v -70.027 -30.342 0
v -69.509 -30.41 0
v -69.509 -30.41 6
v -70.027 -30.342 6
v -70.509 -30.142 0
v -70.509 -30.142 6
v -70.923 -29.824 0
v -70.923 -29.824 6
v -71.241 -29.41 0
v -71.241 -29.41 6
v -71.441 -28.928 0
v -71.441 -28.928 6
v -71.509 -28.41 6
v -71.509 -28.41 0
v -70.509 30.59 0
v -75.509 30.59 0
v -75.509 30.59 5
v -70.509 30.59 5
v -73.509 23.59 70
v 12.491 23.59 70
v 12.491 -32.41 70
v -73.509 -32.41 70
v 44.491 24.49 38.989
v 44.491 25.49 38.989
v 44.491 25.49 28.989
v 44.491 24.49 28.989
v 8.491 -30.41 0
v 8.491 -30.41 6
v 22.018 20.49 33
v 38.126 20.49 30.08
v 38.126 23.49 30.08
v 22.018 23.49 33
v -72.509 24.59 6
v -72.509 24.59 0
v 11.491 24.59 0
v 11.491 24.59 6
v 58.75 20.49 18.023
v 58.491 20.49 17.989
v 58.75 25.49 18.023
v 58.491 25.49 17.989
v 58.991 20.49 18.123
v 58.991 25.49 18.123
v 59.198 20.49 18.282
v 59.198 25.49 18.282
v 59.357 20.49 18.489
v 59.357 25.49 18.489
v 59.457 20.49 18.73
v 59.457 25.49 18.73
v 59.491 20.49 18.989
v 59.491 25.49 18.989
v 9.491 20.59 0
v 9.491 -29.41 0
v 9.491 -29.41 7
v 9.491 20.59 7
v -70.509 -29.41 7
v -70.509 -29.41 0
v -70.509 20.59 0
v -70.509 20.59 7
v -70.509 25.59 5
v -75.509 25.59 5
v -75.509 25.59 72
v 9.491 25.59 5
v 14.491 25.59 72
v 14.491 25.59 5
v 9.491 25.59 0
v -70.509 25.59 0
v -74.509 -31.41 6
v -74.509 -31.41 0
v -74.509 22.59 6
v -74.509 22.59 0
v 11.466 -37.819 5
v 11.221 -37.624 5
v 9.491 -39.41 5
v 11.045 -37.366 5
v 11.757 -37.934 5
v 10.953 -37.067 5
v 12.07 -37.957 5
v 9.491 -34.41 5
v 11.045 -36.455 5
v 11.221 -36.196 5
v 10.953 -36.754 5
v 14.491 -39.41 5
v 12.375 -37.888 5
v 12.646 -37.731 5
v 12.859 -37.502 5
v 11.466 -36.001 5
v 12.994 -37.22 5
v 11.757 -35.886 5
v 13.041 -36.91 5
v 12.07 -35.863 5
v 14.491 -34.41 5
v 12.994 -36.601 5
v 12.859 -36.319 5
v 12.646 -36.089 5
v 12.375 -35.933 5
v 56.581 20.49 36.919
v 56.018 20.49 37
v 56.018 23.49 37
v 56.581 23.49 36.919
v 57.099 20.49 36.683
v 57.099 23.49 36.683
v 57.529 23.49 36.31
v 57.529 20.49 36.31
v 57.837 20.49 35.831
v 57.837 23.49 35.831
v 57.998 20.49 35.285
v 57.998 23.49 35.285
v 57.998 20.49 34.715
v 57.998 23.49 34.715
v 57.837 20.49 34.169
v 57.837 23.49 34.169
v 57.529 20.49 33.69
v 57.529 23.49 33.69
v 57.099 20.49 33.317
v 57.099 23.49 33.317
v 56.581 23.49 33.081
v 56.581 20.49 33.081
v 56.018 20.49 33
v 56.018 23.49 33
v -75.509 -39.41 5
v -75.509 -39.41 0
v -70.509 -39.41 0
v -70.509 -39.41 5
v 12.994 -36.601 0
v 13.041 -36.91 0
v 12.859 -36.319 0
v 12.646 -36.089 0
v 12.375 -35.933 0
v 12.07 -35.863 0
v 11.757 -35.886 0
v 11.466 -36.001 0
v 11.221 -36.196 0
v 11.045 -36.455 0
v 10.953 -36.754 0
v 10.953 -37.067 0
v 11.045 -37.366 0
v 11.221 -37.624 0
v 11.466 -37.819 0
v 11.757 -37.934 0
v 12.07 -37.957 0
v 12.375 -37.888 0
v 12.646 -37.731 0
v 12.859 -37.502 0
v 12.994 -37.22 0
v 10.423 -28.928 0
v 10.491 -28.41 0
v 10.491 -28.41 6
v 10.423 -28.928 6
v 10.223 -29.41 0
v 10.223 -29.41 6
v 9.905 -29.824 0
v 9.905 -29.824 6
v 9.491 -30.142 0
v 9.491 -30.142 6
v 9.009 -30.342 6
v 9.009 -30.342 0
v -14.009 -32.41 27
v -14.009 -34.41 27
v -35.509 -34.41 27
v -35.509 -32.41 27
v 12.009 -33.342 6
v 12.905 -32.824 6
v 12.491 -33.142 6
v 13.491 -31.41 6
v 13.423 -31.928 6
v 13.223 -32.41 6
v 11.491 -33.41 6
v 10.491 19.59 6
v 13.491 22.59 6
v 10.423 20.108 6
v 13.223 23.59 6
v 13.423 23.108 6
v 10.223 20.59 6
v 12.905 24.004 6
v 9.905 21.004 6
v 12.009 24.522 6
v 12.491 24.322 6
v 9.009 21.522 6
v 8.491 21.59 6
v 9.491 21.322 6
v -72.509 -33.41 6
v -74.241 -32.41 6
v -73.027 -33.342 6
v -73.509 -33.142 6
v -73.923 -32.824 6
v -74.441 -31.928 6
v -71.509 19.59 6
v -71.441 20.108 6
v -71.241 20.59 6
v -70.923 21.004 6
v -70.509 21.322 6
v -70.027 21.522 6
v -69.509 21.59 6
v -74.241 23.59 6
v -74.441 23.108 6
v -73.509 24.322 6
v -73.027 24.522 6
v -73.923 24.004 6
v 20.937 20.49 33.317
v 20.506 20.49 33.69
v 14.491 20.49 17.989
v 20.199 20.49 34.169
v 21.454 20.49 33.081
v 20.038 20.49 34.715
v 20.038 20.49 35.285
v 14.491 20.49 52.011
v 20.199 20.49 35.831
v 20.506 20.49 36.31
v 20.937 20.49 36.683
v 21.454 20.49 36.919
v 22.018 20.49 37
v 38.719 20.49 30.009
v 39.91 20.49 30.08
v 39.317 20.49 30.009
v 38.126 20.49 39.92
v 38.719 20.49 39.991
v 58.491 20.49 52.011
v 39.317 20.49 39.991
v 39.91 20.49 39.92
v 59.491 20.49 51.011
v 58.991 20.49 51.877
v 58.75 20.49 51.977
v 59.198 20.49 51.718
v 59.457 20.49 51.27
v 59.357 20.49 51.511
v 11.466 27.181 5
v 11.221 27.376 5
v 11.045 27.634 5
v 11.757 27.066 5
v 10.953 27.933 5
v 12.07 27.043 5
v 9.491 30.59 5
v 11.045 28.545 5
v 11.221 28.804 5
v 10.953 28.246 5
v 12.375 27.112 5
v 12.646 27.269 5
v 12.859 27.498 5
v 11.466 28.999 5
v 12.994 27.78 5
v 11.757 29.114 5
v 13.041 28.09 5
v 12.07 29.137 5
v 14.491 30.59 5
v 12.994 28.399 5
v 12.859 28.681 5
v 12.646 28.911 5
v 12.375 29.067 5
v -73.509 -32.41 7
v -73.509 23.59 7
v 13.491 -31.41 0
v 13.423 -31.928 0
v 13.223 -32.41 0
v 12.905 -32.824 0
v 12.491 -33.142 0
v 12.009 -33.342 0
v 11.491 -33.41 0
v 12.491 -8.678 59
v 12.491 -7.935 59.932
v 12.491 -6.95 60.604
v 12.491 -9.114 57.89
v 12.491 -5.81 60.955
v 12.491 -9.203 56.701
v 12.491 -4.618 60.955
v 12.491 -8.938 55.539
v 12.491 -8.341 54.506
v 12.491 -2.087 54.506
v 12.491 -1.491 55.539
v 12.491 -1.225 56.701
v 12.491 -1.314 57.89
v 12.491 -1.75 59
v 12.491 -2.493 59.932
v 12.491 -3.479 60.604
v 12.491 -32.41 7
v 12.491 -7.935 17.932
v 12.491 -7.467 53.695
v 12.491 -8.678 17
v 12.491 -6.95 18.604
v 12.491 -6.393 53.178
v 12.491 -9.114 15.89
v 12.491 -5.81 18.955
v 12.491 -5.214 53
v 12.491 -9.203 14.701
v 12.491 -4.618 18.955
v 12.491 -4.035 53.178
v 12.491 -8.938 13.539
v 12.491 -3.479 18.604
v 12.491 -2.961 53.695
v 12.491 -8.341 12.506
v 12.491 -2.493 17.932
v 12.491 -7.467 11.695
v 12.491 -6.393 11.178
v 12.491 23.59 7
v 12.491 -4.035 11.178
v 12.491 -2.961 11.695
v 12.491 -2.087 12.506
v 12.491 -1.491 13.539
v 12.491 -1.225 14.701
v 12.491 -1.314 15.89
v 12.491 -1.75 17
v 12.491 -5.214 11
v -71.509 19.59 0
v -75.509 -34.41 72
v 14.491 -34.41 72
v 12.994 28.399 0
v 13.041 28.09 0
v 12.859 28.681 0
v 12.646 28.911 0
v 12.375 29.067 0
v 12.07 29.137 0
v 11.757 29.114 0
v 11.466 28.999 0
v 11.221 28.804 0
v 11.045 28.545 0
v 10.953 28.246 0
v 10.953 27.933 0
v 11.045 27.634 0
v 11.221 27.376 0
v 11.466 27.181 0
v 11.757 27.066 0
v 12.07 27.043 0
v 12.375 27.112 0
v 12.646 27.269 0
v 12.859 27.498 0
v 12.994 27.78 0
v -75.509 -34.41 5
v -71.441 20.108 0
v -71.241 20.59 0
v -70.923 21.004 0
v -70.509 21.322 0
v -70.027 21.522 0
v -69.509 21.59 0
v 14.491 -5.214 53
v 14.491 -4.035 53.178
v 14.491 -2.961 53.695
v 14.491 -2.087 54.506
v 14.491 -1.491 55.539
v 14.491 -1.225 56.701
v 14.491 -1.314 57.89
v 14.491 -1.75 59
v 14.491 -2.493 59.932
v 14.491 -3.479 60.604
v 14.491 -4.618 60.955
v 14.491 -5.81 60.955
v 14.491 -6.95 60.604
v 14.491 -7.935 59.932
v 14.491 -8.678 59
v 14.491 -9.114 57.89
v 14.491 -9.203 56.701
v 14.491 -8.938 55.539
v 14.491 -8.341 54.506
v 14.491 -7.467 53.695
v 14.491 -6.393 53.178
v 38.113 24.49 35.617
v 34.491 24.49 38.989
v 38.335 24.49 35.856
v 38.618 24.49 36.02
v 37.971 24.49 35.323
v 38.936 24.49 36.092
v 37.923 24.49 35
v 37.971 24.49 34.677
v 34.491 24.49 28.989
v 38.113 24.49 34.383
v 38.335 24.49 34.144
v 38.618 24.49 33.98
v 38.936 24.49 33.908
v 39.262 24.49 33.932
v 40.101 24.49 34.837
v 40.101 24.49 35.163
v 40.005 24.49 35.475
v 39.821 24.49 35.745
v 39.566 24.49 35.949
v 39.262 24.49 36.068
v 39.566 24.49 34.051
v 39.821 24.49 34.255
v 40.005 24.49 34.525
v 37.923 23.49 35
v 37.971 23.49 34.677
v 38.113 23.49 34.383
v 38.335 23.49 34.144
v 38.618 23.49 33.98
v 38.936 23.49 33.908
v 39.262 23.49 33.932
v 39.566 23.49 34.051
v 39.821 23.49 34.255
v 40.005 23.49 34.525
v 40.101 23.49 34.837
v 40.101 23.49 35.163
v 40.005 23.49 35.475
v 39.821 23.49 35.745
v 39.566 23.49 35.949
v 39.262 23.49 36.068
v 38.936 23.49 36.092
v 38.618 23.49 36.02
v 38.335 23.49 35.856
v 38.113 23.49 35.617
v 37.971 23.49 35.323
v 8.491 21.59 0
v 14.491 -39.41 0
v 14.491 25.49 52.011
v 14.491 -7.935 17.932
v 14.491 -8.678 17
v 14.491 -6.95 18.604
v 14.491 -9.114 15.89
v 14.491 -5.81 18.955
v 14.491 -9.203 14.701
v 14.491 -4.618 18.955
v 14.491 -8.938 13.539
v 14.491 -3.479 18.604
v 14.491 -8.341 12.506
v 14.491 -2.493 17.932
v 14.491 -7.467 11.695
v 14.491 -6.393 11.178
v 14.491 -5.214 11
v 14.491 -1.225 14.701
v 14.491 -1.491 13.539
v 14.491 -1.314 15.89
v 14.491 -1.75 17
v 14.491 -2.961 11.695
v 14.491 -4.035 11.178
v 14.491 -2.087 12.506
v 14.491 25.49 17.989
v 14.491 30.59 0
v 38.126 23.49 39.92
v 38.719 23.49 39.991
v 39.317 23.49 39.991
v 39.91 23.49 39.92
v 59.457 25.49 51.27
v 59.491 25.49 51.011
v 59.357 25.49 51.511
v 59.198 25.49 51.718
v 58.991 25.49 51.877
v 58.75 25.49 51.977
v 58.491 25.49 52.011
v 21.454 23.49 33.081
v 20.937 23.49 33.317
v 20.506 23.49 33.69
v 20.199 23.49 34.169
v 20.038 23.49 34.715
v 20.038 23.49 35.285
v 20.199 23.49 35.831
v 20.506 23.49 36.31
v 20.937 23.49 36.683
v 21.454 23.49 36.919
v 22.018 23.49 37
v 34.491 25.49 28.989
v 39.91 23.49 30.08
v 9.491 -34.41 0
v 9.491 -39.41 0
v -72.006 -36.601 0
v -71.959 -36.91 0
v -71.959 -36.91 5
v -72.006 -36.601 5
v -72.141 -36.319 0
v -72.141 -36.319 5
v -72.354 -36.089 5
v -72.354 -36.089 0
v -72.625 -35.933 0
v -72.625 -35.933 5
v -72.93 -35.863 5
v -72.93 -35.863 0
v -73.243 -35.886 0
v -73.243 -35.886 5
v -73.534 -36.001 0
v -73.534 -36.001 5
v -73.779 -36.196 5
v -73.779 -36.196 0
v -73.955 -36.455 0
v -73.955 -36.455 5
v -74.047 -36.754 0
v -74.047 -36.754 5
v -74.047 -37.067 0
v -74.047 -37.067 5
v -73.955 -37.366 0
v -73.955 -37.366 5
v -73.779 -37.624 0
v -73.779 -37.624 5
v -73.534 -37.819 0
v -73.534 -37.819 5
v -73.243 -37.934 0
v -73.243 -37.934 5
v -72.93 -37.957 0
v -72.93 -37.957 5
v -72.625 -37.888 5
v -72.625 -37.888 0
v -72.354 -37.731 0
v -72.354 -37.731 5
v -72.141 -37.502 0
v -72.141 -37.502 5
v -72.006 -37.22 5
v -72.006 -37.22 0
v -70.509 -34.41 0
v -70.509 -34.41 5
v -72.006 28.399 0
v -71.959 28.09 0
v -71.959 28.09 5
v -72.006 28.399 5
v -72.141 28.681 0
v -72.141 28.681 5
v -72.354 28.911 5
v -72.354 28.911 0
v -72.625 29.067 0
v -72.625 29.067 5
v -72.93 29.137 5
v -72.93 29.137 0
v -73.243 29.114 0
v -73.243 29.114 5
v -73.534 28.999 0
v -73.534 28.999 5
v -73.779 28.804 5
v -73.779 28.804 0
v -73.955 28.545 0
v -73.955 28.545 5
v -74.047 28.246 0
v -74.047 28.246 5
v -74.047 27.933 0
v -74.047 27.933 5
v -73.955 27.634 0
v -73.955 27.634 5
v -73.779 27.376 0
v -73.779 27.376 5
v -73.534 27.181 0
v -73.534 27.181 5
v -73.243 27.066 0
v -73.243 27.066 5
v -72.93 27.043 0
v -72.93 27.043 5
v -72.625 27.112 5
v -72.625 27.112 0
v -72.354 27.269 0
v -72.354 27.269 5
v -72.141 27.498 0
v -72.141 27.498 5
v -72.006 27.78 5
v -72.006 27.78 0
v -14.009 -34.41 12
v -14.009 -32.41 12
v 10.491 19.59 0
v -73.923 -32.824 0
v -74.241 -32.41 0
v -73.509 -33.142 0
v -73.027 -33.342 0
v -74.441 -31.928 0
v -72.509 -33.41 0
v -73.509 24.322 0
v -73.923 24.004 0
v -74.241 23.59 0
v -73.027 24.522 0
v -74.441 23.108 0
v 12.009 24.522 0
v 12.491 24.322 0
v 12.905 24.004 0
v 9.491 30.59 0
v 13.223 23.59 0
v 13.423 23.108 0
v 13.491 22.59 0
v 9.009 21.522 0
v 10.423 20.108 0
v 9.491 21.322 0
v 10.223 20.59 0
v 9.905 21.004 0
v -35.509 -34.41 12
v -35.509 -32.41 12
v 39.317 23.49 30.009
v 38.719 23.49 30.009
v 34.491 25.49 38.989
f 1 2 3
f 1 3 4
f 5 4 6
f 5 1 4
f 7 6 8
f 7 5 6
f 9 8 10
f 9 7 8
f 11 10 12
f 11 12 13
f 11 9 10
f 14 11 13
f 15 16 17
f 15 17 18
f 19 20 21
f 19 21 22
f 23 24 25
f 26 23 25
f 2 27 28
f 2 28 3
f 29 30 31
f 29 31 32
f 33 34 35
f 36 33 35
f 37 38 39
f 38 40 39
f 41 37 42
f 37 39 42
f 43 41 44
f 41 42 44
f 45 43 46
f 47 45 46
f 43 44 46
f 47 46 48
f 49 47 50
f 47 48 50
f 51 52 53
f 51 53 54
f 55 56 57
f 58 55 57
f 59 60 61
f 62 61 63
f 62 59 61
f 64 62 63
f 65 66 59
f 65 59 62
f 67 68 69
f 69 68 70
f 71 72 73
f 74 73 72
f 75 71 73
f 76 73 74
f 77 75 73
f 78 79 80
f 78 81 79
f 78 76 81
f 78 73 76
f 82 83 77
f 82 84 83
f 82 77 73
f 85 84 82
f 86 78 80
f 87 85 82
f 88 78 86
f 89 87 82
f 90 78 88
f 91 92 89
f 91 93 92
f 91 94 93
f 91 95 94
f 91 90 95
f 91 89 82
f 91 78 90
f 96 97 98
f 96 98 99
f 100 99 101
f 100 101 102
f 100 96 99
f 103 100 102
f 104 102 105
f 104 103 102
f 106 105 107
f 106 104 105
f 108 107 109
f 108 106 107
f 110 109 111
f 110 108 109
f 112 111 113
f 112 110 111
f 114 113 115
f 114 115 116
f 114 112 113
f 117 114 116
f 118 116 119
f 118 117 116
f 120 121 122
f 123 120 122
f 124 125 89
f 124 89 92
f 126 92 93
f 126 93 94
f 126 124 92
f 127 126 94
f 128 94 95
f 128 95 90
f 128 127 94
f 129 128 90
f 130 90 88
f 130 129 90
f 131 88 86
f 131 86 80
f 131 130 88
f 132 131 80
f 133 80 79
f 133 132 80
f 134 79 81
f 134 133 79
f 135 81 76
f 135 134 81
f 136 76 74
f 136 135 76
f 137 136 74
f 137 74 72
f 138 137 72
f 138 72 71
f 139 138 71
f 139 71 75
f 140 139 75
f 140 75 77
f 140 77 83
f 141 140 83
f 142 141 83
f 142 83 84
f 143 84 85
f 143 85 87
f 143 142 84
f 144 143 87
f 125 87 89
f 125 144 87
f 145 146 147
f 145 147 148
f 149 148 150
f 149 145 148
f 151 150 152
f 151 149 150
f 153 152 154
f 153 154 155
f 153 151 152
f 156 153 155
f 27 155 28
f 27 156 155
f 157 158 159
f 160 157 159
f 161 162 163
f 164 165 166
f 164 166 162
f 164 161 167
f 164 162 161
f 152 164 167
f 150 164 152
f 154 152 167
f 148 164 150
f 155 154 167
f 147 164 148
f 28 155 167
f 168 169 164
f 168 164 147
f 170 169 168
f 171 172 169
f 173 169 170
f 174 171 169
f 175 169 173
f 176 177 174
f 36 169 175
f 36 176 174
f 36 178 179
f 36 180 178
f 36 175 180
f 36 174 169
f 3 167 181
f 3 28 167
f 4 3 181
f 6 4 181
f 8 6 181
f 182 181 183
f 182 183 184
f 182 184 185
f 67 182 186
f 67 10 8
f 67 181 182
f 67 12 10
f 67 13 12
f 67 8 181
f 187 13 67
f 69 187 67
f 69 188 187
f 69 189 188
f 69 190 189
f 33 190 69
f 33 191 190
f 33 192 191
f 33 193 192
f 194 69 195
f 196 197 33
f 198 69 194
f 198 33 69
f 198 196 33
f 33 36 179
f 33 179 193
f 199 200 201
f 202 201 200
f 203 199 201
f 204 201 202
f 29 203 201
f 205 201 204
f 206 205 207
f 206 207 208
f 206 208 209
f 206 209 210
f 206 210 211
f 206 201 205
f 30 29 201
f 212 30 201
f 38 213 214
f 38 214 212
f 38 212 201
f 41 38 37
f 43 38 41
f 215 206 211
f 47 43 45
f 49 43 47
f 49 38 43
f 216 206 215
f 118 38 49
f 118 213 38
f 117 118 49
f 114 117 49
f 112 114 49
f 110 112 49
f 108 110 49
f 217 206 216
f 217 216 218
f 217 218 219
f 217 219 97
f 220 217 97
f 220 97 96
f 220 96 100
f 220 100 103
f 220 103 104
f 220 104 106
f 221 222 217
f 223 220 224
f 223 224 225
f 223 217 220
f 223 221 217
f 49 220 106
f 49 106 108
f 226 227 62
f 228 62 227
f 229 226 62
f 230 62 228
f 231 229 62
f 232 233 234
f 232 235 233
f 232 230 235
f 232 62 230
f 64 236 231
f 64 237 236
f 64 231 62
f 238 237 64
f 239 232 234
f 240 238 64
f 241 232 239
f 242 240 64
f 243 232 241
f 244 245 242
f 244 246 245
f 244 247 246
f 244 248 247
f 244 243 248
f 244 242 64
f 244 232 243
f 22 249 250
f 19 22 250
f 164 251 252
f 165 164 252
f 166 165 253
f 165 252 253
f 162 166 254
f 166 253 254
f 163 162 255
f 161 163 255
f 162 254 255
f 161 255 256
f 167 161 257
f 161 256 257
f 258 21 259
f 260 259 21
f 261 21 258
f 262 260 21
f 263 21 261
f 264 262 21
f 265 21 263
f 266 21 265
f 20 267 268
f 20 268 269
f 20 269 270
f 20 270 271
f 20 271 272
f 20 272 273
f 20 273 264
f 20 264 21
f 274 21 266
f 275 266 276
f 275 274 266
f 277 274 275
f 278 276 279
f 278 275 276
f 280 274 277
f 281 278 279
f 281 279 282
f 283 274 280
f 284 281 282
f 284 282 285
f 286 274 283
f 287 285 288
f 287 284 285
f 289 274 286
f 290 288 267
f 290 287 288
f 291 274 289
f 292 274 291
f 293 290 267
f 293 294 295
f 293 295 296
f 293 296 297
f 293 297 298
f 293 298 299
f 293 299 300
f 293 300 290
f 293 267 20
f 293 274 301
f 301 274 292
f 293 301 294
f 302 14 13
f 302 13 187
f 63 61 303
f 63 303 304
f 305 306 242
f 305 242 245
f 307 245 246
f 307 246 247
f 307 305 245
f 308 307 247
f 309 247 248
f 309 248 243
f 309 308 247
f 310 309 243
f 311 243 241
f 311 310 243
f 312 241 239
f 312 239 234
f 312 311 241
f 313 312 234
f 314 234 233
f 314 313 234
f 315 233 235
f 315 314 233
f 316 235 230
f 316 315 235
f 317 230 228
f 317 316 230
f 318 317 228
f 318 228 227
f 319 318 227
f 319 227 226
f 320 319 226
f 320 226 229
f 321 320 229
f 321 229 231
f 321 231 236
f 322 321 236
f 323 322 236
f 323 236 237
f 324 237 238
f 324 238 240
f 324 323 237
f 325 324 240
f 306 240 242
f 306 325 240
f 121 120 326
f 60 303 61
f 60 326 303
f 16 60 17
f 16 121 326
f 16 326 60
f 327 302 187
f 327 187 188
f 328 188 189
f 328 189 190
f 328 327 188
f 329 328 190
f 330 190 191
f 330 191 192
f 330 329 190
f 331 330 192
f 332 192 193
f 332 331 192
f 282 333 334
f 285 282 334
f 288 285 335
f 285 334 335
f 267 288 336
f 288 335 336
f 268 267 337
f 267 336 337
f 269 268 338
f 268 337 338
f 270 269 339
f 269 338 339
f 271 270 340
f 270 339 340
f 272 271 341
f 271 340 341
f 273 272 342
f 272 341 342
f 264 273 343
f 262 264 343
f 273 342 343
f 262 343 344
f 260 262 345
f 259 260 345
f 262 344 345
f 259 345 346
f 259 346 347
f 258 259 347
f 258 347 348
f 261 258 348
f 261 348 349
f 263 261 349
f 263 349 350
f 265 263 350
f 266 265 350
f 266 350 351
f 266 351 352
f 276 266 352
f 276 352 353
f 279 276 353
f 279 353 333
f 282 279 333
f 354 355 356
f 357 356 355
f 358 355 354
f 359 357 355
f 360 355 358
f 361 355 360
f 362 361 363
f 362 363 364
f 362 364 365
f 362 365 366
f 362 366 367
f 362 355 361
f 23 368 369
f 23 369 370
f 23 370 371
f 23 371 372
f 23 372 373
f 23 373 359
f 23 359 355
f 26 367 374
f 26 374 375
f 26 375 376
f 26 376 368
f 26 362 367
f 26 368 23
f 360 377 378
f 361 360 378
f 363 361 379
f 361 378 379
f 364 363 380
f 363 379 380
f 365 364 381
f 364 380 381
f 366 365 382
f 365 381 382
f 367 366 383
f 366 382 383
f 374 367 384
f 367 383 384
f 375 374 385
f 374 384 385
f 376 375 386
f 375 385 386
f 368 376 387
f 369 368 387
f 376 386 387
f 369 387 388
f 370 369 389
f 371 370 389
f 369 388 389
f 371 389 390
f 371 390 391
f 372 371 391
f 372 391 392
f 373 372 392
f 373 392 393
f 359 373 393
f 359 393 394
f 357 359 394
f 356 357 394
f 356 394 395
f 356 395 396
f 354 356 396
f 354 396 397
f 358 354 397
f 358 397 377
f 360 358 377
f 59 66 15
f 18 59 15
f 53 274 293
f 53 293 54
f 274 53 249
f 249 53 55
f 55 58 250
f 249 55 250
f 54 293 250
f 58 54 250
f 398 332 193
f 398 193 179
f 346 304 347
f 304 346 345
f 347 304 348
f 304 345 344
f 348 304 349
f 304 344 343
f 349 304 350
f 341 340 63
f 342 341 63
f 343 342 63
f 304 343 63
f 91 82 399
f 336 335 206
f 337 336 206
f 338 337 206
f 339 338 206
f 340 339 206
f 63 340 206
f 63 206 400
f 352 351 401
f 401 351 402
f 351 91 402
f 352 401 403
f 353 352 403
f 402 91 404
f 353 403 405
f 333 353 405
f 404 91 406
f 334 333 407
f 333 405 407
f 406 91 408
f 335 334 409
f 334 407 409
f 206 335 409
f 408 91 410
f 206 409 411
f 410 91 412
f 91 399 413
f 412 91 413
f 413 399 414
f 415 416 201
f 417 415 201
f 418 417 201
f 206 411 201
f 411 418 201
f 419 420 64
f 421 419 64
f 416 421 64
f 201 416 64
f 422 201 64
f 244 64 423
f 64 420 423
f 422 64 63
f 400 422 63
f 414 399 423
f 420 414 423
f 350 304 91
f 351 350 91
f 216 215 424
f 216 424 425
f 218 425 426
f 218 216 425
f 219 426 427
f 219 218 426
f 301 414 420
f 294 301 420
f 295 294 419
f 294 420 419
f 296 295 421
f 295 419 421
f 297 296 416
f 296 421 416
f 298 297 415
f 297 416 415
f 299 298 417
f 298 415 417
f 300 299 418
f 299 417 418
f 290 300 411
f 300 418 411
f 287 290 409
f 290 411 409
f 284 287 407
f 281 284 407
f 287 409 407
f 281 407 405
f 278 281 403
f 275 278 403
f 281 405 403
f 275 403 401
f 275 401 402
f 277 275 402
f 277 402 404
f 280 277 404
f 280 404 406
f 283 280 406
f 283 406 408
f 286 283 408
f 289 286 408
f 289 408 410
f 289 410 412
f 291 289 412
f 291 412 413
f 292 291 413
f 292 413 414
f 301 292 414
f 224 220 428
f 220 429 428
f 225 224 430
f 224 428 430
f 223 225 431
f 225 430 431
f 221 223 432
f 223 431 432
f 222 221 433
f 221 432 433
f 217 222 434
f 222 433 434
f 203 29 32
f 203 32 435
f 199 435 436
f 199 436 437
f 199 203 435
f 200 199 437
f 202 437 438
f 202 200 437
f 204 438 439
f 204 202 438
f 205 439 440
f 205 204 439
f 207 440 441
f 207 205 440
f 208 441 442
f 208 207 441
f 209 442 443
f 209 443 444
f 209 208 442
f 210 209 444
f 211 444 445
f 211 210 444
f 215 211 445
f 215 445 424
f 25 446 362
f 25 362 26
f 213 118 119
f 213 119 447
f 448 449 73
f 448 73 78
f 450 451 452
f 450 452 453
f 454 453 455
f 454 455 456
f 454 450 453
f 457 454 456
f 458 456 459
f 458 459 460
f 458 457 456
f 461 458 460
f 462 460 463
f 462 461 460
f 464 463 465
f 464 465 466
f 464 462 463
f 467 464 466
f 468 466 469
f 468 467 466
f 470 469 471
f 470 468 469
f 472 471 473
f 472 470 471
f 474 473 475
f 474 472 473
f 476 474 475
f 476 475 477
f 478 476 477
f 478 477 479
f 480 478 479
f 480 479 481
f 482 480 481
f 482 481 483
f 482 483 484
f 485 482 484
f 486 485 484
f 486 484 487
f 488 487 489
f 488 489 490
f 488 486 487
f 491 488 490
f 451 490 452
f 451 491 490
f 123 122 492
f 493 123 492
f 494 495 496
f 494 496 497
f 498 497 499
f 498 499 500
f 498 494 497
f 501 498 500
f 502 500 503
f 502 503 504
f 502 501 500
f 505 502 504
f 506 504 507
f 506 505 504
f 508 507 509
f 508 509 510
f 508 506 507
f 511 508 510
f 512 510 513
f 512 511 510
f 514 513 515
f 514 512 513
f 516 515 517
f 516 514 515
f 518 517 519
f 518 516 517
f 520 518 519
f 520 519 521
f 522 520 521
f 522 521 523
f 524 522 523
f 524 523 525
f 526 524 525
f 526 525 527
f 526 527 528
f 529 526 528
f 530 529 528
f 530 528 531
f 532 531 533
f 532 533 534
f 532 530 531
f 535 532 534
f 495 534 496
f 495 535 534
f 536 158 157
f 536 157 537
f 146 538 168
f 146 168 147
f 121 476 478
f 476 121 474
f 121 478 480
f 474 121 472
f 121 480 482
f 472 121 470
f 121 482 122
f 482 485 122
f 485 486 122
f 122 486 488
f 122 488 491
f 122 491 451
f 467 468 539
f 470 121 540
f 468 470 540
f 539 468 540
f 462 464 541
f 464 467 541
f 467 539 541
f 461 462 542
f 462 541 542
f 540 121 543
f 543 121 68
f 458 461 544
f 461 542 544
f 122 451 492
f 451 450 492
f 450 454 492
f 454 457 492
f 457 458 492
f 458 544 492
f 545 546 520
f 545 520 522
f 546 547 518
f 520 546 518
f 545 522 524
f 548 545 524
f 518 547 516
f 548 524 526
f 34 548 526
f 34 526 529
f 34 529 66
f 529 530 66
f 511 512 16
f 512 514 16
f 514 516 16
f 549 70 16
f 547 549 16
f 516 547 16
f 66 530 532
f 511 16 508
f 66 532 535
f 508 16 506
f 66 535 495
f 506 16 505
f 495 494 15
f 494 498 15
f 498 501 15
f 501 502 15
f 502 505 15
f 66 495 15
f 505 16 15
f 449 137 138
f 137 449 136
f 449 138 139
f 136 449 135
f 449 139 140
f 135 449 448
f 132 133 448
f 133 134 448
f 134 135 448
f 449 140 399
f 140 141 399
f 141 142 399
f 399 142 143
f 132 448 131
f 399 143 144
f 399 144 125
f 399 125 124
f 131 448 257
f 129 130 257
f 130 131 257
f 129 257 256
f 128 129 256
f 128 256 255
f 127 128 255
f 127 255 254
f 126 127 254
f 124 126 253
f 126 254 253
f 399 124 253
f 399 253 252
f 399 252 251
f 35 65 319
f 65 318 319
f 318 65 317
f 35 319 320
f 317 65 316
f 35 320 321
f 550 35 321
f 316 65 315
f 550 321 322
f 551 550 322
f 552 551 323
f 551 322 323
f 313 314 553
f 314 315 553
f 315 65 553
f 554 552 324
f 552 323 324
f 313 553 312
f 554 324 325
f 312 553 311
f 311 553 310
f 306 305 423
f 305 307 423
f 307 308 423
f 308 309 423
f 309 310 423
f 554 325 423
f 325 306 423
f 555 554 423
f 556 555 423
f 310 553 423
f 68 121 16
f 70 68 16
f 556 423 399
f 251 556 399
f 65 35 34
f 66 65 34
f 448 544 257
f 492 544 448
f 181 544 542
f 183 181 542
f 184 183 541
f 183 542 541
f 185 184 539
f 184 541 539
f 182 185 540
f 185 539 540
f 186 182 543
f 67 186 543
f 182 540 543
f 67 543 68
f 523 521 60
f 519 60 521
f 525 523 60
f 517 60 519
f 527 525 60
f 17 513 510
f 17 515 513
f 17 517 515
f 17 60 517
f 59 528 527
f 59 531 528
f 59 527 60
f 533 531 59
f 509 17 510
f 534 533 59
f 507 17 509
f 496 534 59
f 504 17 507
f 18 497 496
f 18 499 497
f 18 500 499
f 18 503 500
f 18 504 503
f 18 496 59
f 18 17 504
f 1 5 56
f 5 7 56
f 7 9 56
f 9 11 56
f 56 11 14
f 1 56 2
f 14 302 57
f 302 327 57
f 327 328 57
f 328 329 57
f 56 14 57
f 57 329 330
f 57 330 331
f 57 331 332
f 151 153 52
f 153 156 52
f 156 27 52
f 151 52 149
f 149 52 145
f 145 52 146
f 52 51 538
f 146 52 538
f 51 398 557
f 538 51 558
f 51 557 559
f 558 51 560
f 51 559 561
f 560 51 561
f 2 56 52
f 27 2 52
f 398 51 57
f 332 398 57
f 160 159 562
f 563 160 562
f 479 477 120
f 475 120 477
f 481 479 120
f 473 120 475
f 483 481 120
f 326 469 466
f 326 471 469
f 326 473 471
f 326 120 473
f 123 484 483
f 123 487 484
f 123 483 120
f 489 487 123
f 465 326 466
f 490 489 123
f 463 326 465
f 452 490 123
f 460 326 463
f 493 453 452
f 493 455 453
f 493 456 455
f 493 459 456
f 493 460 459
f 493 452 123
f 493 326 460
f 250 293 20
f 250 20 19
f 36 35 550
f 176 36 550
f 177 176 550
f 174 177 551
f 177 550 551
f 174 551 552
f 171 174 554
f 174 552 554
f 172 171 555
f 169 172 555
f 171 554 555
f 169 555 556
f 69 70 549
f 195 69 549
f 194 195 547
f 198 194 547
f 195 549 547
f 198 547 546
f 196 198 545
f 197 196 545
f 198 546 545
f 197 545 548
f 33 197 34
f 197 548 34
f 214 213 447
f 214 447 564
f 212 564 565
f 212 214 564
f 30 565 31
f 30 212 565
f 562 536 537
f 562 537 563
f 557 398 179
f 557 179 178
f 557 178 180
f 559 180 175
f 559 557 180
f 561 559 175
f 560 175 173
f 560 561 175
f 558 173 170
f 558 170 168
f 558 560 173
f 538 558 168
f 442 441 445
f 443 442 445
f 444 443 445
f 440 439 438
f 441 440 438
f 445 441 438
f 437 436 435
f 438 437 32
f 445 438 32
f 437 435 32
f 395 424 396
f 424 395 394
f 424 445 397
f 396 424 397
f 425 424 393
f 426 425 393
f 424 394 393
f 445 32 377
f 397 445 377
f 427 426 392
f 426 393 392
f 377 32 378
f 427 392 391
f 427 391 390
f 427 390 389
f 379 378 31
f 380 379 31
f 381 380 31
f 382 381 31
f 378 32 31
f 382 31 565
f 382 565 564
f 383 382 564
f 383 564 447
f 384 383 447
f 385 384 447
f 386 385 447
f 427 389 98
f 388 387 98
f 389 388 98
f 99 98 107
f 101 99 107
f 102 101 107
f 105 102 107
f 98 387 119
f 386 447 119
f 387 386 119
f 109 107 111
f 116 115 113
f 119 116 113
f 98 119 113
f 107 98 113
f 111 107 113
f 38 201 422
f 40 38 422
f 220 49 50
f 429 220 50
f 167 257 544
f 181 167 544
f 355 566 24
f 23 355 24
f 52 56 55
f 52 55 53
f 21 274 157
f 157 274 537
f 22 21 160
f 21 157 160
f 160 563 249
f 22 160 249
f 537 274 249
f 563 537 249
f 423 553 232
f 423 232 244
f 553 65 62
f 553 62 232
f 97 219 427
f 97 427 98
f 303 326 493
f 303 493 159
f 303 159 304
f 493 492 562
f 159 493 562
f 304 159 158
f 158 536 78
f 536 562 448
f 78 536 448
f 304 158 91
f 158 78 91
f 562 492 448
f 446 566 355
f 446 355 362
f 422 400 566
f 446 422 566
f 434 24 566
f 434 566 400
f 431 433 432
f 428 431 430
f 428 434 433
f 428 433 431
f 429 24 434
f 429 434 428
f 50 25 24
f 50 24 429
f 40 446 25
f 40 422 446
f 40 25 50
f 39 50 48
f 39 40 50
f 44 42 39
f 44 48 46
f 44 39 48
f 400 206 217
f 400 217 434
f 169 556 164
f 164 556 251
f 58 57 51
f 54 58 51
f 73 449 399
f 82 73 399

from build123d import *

# Parameters (mm, degrees)
SKETCH_1_W           = 135
SKETCH_1_H           = 60
EXTRUDE_1_DEPTH      = 70
SKETCH_6_W           = 45
SKETCH_6_H           = 70
CUT_EXTRUDE_1_DEPTH  = 0.1
SKETCH_5_W           = 45
SKETCH_5_H           = 70
CUT_EXTRUDE_2_DEPTH  = 54.9
SKETCH_7_W           = 80
SKETCH_7_H           = 50
CUT_EXTRUDE_3_DEPTH  = 75
CUT_EXTRUDE_4_DEPTH  = 6
SKETCH_10_W          = 21.5
SKETCH_10_H          = 15
CUT_EXTRUDE_6_DEPTH  = 10
SKETCH_12_W          = 18.906228009
SKETCH_12_H          = 30.34929214
CUT_EXTRUDE_7_DEPTH  = 50
CUT_EXTRUDE_8_DEPTH  = 3
SKETCH_15_W          = 10
SKETCH_15_H          = 10
CUT_EXTRUDE_9_DEPTH  = 1
SKETCH_17_R          = 1.095275866
CUT_EXTRUDE_11_DEPTH = 7
SKETCH_18_W          = 5
SKETCH_18_H          = 5
SKETCH_18_R          = 1.05
EXTRUDE_2_DEPTH      = 5
SKETCH_19_W          = 90
SKETCH_19_H          = 60
EXTRUDE_3_DEPTH      = 2
SKETCH_20_R          = 4
CUT_EXTRUDE_12_DEPTH = 10
SKETCH_21_W          = 86
SKETCH_21_H          = 56
CUT_EXTRUDE_13_DEPTH = 63
FILLET_3_R           = 1
FILLET_4_R           = 1


with BuildPart() as part:
    # 草圖1 → 填料-伸長1 (new body)
    with BuildSketch(Plane.XY):
        with Locations((-8.008902174, -4.41011236)):
            Rectangle(SKETCH_1_W, SKETCH_1_H)
    extrude(amount=EXTRUDE_1_DEPTH)

    # 草圖6 → 除料-伸長1 (cut)
    with BuildSketch(Plane(origin=(0, 25.58988764, 0), x_dir=(1, 0, 0), z_dir=(0, 1, 0))):
        with Locations((36.991097826, -35)):
            Rectangle(SKETCH_6_W, SKETCH_6_H)
    extrude(amount=-CUT_EXTRUDE_1_DEPTH, mode=Mode.SUBTRACT)

    # 草圖5 → 除料-伸長2 (cut)
    with BuildSketch(Plane.XZ.offset(34.41011236)):
        with Locations((36.991097826, 35)):
            Rectangle(SKETCH_5_W, SKETCH_5_H)
    extrude(amount=-CUT_EXTRUDE_2_DEPTH, mode=Mode.SUBTRACT)

    # 草圖7 → 除料-伸長3 (cut)
    with BuildSketch(Plane.XY):
        with Locations((-30.508902174, -4.41011236)):
            Rectangle(SKETCH_7_W, SKETCH_7_H)
    extrude(amount=CUT_EXTRUDE_3_DEPTH, mode=Mode.SUBTRACT)

    # 草圖8 → 除料-伸長4 (cut)
    with BuildSketch(Plane(origin=(0, 0, 0), x_dir=(-1, 0, 0), z_dir=(0, 0, -1))):
        with BuildLine():
            Line((-13.491097826, 22.58988764), (-13.491097826, -31.41011236))
            ThreePointArc((-13.491097826, -31.41011236), (-12.905311388, -32.824325922), (-11.491097826, -33.41011236))
            Line((-11.491097826, -33.41011236), (72.508902174, -33.41011236))
            ThreePointArc((72.508902174, -33.41011236), (73.923115736, -32.824325922), (74.508902174, -31.41011236))
            Line((74.508902174, -31.41011236), (74.508902174, 22.58988764))
            ThreePointArc((74.508902174, 22.58988764), (73.923115736, 24.004101203), (72.508902174, 24.58988764))
            Line((72.508902174, 24.58988764), (-11.491097826, 24.58988764))
            ThreePointArc((-11.491097826, 24.58988764), (-12.905311388, 24.004101203), (-13.491097826, 22.58988764))
        make_face()
        with BuildLine():
            Line((71.508902174, -28.41011236), (71.508902174, 19.58988764))
            ThreePointArc((71.508902174, 19.58988764), (70.923115736, 21.004101203), (69.508902174, 21.58988764))
            Line((69.508902174, 21.58988764), (-8.491097826, 21.58988764))
            ThreePointArc((-8.491097826, 21.58988764), (-9.905311388, 21.004101203), (-10.491097826, 19.58988764))
            Line((-10.491097826, 19.58988764), (-10.491097826, -28.41011236))
            ThreePointArc((-10.491097826, -28.41011236), (-9.905311388, -29.824325922), (-8.491097826, -30.41011236))
            Line((-8.491097826, -30.41011236), (69.508902174, -30.41011236))
            ThreePointArc((69.508902174, -30.41011236), (70.923115736, -29.824325922), (71.508902174, -28.41011236))
        make_face(mode=Mode.SUBTRACT)
    extrude(amount=-CUT_EXTRUDE_4_DEPTH, mode=Mode.SUBTRACT)

    # 草圖10 → 除料-伸長6 (cut)
    with BuildSketch(Plane(origin=(0, -34.41011236, 0), x_dir=(-1, 0, 0), z_dir=(0, -1, 0))):
        with Locations((24.758902174, -19.5)):
            Rectangle(SKETCH_10_W, SKETCH_10_H)
    extrude(amount=-CUT_EXTRUDE_6_DEPTH, mode=Mode.SUBTRACT)

    # 草圖12 → 除料-伸長7 (cut)
    with BuildSketch(Plane(origin=(14.491097826, 0, 0), x_dir=(0, 0, -1), z_dir=(1, 0, 0))):
        with Locations((-61.464370754, 15.76453371)):
            Rectangle(SKETCH_12_W, SKETCH_12_H)
        with Locations((-8.535629247, 15.76453371)):
            Rectangle(SKETCH_12_W, SKETCH_12_H)
    extrude(amount=CUT_EXTRUDE_7_DEPTH, mode=Mode.SUBTRACT)

    # 草圖14 → 除料-伸長8 (cut)
    with BuildSketch(Plane(origin=(0, 20.48988764, 0), x_dir=(-1, 0, 0), z_dir=(0, -1, 0))):
        with BuildLine():
            Line((-38.126130034, -30.080170747), (-22.017914827, -33))
            ThreePointArc((-22.017914827, -33), (-20.017914827, -35), (-22.017914827, -37))
            Line((-22.017914827, -37), (-38.126130034, -39.919829253))
            ThreePointArc((-38.126130034, -39.919829253), (-39.017914827, -40), (-39.909699621, -39.919829253))
            Line((-39.909699621, -39.919829253), (-56.017914827, -37))
            ThreePointArc((-56.017914827, -37), (-58.017914827, -35), (-56.017914827, -33))
            Line((-56.017914827, -33), (-39.909699621, -30.080170747))
            ThreePointArc((-39.909699621, -30.080170747), (-39.017914827, -30), (-38.126130034, -30.080170747))
        make_face()
    extrude(amount=-CUT_EXTRUDE_8_DEPTH, mode=Mode.SUBTRACT)

    # 草圖15 → 除料-伸長9 (cut)
    with BuildSketch(Plane(origin=(0, 25.48988764, 0), x_dir=(1, 0, 0), z_dir=(0, 1, 0))):
        with Locations((39.491097826, -33.988743251)):
            Rectangle(SKETCH_15_W, SKETCH_15_H)
    extrude(amount=-CUT_EXTRUDE_9_DEPTH, mode=Mode.SUBTRACT)

    # 草圖17 → 除料-伸長11 (cut)
    with BuildSketch(Plane(origin=(0, 20.48988764, 0), x_dir=(-1, 0, 0), z_dir=(0, -1, 0))):
        with Locations((-39.017914827, -35)):
            Circle(SKETCH_17_R)
    extrude(amount=-CUT_EXTRUDE_11_DEPTH, mode=Mode.SUBTRACT)

    # 草圖18 → 填料-伸長2 (add)
    with BuildSketch(Plane.XY):
        with Locations((11.991097826, 28.08988764)):
            Rectangle(SKETCH_18_W, SKETCH_18_H)
        with Locations((11.991097826, 28.08988764)):
            Circle(SKETCH_18_R, mode=Mode.SUBTRACT)
        with Locations((-73.008902174, 28.08988764)):
            Rectangle(SKETCH_18_W, SKETCH_18_H)
        with Locations((-73.008902174, 28.08988764)):
            Circle(SKETCH_18_R, mode=Mode.SUBTRACT)
        with Locations((-73.008902174, -36.91011236)):
            Rectangle(SKETCH_18_W, SKETCH_18_H)
        with Locations((-73.008902174, -36.91011236)):
            Circle(SKETCH_18_R, mode=Mode.SUBTRACT)
        with Locations((11.991097826, -36.91011236)):
            Rectangle(SKETCH_18_W, SKETCH_18_H)
        with Locations((11.991097826, -36.91011236)):
            Circle(SKETCH_18_R, mode=Mode.SUBTRACT)
    extrude(amount=EXTRUDE_2_DEPTH)

    # 草圖19 → 填料-伸長3 (add)
    with BuildSketch(Plane.XY.offset(70)):
        with Locations((-30.508902174, -4.41011236)):
            Rectangle(SKETCH_19_W, SKETCH_19_H)
    extrude(amount=EXTRUDE_3_DEPTH)

    # 草圖20 → 除料-伸長12 (cut)
    with BuildSketch(Plane(origin=(14.491097826, 0, 0), x_dir=(0, 0, -1), z_dir=(1, 0, 0))):
        with Locations((-15, -5.21415213)):
            Circle(SKETCH_20_R)
        with Locations((-57, -5.21415213)):
            Circle(SKETCH_20_R)
    extrude(amount=-CUT_EXTRUDE_12_DEPTH, mode=Mode.SUBTRACT)

    # 草圖21 → 除料-伸長13 (cut)
    with BuildSketch(Plane(origin=(0, 0, 7), x_dir=(-1, 0, 0), z_dir=(0, 0, -1))):
        with Locations((30.508902174, -4.41011236)):
            Rectangle(SKETCH_21_W, SKETCH_21_H)
    extrude(amount=-CUT_EXTRUDE_13_DEPTH, mode=Mode.SUBTRACT)

    # 圓角3
    fillet_3_edges = [part.edges().sort_by_distance(p)[0] for p in [
        (59.491097826, 22.98988764, 17.988743251),
    ]]
    fillet(fillet_3_edges, radius=FILLET_3_R)

    # 圓角4
    fillet_4_edges = [part.edges().sort_by_distance(p)[0] for p in [
        (59.491097826, 22.98988764, 52.011256749),
    ]]
    fillet(fillet_4_edges, radius=FILLET_4_R)


solid = part.part
